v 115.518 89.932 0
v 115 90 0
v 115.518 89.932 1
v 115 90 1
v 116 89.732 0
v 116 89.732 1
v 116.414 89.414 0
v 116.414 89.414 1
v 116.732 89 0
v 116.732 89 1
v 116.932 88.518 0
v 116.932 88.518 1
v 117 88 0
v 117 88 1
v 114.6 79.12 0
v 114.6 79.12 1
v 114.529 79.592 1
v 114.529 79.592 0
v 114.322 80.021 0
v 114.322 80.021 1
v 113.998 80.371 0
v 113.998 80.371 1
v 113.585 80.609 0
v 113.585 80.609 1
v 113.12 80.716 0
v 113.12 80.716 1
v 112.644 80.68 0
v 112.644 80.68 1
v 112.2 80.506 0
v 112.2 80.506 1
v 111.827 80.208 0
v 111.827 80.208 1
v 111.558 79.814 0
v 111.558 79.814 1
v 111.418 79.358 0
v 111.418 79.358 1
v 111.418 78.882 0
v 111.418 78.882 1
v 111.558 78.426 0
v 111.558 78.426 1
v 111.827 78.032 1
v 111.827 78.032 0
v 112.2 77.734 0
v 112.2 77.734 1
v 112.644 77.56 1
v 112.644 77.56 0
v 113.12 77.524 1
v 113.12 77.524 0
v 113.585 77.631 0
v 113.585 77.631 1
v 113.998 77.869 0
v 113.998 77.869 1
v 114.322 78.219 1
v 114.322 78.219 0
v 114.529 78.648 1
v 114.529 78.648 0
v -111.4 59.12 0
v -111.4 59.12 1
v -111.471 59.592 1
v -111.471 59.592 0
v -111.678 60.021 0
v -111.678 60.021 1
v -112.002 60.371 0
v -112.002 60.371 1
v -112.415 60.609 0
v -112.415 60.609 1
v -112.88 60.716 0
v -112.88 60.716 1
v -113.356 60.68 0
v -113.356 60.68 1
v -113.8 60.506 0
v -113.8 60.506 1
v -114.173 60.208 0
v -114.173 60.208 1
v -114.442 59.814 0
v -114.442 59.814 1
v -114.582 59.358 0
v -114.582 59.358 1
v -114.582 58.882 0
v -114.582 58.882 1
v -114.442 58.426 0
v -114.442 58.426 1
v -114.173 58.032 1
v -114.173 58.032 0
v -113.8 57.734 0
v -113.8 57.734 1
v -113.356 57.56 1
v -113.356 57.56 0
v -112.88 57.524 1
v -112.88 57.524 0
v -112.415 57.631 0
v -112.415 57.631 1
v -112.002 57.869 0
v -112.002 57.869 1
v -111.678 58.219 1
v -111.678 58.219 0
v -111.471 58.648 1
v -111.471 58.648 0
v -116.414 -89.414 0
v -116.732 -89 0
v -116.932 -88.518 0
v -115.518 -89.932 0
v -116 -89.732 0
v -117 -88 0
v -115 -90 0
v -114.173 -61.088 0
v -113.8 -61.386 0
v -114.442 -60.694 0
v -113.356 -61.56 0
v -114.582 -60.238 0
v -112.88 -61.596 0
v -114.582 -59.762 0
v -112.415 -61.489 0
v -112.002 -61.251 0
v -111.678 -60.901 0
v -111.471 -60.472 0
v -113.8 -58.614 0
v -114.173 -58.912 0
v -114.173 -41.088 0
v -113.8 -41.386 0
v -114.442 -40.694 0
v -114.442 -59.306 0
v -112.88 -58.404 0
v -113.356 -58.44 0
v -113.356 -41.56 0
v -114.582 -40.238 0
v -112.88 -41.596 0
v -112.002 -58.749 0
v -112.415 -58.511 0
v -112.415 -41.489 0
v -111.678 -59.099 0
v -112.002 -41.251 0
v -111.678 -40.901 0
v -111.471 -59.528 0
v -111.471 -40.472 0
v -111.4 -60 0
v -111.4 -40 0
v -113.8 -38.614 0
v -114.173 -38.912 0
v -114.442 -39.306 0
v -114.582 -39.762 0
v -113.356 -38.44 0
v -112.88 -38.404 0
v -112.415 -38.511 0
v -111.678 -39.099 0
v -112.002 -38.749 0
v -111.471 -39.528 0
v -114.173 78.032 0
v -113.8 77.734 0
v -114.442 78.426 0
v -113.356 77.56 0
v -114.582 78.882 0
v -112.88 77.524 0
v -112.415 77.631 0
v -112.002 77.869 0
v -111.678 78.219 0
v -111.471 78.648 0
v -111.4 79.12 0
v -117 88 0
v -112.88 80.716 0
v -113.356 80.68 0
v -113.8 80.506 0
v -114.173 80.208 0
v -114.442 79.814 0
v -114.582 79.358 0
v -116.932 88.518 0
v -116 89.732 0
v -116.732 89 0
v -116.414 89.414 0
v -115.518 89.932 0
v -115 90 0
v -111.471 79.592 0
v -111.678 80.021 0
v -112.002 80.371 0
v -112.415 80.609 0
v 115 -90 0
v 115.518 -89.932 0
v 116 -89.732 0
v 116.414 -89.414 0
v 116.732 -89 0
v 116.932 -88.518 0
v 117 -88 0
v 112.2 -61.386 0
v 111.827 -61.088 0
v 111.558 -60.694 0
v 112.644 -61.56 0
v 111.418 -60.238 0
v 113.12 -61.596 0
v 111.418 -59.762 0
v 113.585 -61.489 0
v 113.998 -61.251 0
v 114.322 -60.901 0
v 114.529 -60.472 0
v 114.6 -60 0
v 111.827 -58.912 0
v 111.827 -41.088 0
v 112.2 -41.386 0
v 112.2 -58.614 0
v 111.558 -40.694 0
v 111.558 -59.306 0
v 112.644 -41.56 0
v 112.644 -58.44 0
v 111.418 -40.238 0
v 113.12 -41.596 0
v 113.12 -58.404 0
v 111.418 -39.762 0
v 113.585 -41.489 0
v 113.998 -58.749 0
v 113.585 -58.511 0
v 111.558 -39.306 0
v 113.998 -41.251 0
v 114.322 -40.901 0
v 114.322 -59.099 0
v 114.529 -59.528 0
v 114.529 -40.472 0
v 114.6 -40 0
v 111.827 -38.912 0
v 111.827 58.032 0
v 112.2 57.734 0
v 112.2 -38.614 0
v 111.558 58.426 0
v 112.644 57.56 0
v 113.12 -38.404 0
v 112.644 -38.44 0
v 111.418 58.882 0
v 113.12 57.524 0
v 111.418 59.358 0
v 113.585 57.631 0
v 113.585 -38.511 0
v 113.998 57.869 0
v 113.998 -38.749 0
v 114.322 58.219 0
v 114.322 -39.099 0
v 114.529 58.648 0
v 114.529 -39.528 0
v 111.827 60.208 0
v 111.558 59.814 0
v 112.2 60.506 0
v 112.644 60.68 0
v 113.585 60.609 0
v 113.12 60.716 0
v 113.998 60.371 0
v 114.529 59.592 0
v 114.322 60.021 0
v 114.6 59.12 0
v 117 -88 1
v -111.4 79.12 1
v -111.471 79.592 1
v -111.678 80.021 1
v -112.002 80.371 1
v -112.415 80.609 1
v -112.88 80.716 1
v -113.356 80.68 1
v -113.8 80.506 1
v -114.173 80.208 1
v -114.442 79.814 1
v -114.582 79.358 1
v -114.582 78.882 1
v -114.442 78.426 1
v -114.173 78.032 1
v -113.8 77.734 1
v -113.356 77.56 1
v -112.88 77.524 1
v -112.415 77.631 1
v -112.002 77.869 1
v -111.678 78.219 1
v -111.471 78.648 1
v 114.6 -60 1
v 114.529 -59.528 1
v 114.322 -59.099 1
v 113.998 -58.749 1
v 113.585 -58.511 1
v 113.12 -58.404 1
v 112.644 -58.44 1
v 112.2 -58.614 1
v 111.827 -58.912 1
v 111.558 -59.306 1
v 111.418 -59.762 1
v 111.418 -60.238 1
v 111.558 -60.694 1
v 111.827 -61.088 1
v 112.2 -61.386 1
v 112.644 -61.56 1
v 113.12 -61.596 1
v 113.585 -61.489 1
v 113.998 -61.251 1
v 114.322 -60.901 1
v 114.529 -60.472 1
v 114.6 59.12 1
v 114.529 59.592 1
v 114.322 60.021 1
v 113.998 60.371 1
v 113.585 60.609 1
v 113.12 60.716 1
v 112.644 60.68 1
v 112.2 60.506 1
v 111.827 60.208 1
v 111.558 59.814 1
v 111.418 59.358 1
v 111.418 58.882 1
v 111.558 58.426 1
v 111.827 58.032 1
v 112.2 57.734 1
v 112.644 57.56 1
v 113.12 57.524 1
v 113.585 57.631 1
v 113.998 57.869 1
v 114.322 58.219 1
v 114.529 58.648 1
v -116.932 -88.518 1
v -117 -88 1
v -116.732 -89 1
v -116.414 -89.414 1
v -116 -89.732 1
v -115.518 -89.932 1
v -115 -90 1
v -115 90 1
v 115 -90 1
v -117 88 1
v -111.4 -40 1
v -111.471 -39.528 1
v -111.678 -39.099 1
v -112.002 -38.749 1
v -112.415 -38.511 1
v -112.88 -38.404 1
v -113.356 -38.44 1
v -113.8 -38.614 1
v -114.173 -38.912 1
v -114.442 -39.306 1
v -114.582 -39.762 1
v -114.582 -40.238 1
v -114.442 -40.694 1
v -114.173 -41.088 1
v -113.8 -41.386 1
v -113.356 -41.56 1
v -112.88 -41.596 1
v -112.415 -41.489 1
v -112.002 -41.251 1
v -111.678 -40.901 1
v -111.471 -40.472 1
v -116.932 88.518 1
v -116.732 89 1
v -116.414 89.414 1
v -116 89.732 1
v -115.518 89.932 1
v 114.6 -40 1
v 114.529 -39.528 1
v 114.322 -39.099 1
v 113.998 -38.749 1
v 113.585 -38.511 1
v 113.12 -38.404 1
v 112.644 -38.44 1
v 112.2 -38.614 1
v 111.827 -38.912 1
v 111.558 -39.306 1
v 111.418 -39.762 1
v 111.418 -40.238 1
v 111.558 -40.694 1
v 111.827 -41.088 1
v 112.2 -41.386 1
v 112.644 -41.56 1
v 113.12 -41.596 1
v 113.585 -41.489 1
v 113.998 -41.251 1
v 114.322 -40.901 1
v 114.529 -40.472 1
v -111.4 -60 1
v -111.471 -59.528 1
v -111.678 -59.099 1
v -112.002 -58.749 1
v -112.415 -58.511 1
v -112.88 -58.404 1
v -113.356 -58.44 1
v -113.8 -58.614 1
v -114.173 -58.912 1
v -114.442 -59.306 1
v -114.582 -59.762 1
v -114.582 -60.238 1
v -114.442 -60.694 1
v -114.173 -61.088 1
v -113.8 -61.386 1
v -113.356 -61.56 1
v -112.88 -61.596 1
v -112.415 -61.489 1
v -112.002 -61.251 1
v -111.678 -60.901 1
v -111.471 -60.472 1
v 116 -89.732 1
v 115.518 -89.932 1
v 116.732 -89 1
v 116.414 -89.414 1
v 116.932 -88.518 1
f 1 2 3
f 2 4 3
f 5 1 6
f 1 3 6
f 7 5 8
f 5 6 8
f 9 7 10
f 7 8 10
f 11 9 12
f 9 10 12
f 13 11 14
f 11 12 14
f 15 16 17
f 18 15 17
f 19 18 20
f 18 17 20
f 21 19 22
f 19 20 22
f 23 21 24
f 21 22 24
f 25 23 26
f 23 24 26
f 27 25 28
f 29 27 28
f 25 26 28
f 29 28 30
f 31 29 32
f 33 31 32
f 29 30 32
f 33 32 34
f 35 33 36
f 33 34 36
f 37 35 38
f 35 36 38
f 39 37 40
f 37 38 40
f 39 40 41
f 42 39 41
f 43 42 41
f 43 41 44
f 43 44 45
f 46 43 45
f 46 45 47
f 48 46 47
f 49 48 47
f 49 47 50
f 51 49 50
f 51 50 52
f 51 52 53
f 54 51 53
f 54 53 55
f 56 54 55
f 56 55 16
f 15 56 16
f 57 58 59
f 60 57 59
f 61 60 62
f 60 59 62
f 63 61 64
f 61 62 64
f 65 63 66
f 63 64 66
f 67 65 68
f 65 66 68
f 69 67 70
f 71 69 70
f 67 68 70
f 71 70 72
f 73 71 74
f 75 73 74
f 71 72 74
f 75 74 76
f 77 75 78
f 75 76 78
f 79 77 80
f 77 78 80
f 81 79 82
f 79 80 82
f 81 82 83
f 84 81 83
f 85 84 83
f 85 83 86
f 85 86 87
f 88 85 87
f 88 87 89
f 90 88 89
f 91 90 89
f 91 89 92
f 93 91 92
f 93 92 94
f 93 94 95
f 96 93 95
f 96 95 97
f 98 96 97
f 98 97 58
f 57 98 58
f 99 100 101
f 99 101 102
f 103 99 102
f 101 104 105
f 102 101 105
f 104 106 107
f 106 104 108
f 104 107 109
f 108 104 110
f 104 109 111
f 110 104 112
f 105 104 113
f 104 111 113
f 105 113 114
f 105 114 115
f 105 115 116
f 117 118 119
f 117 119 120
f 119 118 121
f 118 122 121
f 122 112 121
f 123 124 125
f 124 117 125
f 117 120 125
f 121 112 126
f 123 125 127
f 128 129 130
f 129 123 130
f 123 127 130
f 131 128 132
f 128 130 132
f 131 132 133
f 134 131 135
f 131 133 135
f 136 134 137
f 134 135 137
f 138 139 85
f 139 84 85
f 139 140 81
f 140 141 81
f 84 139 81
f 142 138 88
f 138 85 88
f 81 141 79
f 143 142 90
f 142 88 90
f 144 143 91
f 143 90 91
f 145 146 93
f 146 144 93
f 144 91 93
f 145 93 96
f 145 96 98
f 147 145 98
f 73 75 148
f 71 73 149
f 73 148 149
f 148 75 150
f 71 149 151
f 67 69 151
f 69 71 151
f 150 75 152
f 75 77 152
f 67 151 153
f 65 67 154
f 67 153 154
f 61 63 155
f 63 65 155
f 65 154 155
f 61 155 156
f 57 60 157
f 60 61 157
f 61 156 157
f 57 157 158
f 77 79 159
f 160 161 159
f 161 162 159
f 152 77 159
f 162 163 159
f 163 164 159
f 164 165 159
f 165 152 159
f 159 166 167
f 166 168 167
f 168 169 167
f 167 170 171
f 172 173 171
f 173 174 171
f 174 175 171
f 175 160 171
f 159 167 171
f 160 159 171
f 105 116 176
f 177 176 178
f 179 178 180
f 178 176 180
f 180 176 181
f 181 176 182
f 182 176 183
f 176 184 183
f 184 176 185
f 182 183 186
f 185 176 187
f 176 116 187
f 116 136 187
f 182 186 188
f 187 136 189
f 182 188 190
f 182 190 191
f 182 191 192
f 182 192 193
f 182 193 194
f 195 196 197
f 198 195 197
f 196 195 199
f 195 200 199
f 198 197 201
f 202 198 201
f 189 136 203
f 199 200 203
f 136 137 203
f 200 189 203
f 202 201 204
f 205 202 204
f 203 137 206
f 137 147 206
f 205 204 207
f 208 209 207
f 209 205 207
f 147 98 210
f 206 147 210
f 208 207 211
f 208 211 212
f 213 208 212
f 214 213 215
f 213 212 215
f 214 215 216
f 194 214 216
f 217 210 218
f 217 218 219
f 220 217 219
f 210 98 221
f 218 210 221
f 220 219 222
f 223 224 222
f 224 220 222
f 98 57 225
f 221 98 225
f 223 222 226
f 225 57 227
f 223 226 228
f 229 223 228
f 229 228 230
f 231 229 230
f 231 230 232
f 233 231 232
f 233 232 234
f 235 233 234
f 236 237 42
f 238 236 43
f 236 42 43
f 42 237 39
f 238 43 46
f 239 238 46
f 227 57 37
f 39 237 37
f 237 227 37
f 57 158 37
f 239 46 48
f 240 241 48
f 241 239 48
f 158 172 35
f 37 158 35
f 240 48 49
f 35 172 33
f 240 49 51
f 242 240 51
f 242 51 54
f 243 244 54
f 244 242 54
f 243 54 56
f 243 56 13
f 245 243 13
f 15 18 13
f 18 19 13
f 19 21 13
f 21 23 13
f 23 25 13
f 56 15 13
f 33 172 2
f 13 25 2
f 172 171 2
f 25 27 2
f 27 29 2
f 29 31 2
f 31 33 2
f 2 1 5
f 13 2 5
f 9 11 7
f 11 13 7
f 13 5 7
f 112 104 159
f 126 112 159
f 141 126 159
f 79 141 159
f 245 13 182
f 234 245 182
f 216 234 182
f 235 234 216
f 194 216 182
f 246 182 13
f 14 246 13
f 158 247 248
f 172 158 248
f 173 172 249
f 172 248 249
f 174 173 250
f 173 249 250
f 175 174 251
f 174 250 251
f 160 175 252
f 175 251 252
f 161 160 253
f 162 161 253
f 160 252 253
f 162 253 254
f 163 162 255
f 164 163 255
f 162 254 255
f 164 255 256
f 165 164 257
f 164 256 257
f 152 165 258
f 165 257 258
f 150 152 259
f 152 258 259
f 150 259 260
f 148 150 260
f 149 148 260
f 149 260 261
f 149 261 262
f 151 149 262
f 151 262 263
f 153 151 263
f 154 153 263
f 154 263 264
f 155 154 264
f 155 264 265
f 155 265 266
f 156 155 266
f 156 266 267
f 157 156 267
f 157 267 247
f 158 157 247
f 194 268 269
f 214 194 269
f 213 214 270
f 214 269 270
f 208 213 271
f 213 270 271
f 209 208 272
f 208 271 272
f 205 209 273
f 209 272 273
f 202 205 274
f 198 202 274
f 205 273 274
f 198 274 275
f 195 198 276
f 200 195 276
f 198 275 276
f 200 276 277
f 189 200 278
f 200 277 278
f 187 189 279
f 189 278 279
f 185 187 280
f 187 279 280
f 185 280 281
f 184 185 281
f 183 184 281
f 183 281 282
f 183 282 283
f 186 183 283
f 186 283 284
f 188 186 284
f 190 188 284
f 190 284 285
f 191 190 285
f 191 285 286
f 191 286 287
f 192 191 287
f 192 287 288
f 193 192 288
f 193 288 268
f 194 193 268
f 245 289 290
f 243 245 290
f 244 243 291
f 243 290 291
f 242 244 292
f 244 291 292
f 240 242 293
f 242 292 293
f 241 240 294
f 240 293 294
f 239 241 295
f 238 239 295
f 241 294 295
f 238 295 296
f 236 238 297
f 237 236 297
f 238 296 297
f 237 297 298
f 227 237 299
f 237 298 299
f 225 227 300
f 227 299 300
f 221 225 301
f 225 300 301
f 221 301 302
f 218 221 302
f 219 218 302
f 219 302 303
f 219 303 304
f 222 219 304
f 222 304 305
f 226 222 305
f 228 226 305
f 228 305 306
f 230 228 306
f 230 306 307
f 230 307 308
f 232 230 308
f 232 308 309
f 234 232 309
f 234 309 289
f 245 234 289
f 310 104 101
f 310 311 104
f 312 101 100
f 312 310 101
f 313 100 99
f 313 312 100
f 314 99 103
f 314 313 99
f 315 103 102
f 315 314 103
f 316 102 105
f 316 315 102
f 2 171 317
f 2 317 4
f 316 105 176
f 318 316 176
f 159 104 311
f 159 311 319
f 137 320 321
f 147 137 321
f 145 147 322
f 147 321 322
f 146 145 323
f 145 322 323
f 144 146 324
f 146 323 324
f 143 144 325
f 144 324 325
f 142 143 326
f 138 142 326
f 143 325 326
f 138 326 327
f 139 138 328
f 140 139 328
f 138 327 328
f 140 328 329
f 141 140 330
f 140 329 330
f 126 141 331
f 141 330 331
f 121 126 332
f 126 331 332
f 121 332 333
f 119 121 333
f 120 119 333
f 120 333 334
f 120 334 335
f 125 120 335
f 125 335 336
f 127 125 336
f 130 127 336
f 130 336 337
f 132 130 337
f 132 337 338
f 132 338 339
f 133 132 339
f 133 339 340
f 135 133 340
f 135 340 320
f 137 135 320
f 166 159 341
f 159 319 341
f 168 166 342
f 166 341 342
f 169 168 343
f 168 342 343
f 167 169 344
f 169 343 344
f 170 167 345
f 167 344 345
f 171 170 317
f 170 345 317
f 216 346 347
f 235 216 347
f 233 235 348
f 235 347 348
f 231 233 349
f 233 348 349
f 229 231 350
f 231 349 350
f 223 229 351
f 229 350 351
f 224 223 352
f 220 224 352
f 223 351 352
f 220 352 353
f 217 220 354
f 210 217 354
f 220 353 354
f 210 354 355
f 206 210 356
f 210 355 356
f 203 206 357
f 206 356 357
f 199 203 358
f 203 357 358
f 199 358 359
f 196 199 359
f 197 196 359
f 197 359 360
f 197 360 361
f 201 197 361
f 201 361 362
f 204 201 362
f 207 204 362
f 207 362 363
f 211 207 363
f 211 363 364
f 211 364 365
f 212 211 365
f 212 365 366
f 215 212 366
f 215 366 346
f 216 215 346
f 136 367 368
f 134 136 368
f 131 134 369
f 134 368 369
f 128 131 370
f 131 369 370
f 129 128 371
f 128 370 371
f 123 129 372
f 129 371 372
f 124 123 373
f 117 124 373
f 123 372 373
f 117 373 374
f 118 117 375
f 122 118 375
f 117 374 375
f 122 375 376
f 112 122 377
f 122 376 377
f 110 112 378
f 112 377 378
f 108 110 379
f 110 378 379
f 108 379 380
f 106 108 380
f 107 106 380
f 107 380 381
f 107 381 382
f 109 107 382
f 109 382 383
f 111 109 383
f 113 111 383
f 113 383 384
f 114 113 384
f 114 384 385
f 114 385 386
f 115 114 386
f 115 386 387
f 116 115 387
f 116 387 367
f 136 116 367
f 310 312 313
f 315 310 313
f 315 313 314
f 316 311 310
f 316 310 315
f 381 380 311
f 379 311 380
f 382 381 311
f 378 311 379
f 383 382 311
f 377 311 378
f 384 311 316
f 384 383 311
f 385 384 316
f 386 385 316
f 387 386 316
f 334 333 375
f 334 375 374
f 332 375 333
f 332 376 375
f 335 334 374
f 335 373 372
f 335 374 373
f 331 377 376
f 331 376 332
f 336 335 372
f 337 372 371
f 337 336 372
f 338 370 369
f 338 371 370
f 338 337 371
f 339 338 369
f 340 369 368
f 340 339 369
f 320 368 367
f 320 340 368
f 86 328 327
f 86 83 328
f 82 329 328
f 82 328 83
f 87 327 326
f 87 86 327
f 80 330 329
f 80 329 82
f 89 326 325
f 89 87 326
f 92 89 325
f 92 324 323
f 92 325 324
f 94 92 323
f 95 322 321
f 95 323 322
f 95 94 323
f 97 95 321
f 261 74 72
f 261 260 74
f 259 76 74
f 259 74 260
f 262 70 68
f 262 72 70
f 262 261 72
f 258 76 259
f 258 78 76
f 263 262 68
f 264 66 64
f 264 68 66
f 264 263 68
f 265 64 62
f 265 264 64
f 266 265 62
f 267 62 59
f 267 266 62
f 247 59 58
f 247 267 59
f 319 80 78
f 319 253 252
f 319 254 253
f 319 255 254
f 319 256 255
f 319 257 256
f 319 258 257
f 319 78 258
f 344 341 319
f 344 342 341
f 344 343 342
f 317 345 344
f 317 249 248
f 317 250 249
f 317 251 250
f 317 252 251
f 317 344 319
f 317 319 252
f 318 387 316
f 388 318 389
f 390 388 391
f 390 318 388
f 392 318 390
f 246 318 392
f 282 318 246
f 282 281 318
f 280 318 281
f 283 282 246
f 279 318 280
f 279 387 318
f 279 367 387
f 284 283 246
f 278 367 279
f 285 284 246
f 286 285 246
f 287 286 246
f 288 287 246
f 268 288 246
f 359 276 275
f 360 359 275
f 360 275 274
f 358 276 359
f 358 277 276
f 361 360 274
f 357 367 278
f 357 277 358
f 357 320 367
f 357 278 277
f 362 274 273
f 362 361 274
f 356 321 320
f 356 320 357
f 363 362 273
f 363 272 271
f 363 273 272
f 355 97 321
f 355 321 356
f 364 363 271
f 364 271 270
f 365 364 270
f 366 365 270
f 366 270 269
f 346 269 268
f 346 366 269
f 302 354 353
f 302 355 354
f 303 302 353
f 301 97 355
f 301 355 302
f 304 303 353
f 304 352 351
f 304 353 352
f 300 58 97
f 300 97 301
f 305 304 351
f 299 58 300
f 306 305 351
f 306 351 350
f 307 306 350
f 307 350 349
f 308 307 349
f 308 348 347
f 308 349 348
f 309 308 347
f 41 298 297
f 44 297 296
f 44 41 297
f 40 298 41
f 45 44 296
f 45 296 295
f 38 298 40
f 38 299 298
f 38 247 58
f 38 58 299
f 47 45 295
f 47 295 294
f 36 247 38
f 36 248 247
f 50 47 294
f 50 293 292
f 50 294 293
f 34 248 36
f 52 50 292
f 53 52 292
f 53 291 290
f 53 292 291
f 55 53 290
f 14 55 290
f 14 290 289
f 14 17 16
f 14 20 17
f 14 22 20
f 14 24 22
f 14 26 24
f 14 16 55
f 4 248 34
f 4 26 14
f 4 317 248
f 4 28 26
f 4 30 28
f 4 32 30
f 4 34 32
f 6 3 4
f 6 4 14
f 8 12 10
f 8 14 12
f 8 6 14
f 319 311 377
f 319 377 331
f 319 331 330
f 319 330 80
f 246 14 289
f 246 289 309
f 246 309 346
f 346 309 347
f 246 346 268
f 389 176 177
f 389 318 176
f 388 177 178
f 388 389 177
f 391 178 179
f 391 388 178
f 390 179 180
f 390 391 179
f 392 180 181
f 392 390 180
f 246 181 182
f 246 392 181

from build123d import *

# Parameters (mm, degrees)
SKETCH_1_W          = 234
SKETCH_1_H          = 180
EXTRUDE_1_DEPTH     = 1
SKETCH_2_R          = 1.6
CUT_EXTRUDE_1_DEPTH = 10
FILLET_1_R          = 2


with BuildPart() as part:
    # 草图1 → 凸台-拉伸1 (new body)
    with BuildSketch(Plane.XY):
        Rectangle(SKETCH_1_W, SKETCH_1_H)
    extrude(amount=EXTRUDE_1_DEPTH)

    # 草图2 → 切除-拉伸1 (cut)
    with BuildSketch(Plane.XY.offset(1)):
        with Locations((-113, -60)):
            Circle(SKETCH_2_R)
        with Locations((-113, -40)):
            Circle(SKETCH_2_R)
        with Locations((-113, 59.12)):
            Circle(SKETCH_2_R)
        with Locations((-113, 79.12)):
            Circle(SKETCH_2_R)
        with Locations((113, -60)):
            Circle(SKETCH_2_R)
        with Locations((113, -40)):
            Circle(SKETCH_2_R)
        with Locations((113, 59.12)):
            Circle(SKETCH_2_R)
        with Locations((113, 79.12)):
            Circle(SKETCH_2_R)
    extrude(amount=-CUT_EXTRUDE_1_DEPTH, mode=Mode.SUBTRACT)

    # 圆角1
    fillet_1_edges = [part.edges().sort_by_distance(p)[0] for p in [
        (117, -90, 0.5),
        (-117, -90, 0.5),
        (-117, 90, 0.5),
        (117, 90, 0.5),
    ]]
    fillet(fillet_1_edges, radius=FILLET_1_R)


solid = part.part
